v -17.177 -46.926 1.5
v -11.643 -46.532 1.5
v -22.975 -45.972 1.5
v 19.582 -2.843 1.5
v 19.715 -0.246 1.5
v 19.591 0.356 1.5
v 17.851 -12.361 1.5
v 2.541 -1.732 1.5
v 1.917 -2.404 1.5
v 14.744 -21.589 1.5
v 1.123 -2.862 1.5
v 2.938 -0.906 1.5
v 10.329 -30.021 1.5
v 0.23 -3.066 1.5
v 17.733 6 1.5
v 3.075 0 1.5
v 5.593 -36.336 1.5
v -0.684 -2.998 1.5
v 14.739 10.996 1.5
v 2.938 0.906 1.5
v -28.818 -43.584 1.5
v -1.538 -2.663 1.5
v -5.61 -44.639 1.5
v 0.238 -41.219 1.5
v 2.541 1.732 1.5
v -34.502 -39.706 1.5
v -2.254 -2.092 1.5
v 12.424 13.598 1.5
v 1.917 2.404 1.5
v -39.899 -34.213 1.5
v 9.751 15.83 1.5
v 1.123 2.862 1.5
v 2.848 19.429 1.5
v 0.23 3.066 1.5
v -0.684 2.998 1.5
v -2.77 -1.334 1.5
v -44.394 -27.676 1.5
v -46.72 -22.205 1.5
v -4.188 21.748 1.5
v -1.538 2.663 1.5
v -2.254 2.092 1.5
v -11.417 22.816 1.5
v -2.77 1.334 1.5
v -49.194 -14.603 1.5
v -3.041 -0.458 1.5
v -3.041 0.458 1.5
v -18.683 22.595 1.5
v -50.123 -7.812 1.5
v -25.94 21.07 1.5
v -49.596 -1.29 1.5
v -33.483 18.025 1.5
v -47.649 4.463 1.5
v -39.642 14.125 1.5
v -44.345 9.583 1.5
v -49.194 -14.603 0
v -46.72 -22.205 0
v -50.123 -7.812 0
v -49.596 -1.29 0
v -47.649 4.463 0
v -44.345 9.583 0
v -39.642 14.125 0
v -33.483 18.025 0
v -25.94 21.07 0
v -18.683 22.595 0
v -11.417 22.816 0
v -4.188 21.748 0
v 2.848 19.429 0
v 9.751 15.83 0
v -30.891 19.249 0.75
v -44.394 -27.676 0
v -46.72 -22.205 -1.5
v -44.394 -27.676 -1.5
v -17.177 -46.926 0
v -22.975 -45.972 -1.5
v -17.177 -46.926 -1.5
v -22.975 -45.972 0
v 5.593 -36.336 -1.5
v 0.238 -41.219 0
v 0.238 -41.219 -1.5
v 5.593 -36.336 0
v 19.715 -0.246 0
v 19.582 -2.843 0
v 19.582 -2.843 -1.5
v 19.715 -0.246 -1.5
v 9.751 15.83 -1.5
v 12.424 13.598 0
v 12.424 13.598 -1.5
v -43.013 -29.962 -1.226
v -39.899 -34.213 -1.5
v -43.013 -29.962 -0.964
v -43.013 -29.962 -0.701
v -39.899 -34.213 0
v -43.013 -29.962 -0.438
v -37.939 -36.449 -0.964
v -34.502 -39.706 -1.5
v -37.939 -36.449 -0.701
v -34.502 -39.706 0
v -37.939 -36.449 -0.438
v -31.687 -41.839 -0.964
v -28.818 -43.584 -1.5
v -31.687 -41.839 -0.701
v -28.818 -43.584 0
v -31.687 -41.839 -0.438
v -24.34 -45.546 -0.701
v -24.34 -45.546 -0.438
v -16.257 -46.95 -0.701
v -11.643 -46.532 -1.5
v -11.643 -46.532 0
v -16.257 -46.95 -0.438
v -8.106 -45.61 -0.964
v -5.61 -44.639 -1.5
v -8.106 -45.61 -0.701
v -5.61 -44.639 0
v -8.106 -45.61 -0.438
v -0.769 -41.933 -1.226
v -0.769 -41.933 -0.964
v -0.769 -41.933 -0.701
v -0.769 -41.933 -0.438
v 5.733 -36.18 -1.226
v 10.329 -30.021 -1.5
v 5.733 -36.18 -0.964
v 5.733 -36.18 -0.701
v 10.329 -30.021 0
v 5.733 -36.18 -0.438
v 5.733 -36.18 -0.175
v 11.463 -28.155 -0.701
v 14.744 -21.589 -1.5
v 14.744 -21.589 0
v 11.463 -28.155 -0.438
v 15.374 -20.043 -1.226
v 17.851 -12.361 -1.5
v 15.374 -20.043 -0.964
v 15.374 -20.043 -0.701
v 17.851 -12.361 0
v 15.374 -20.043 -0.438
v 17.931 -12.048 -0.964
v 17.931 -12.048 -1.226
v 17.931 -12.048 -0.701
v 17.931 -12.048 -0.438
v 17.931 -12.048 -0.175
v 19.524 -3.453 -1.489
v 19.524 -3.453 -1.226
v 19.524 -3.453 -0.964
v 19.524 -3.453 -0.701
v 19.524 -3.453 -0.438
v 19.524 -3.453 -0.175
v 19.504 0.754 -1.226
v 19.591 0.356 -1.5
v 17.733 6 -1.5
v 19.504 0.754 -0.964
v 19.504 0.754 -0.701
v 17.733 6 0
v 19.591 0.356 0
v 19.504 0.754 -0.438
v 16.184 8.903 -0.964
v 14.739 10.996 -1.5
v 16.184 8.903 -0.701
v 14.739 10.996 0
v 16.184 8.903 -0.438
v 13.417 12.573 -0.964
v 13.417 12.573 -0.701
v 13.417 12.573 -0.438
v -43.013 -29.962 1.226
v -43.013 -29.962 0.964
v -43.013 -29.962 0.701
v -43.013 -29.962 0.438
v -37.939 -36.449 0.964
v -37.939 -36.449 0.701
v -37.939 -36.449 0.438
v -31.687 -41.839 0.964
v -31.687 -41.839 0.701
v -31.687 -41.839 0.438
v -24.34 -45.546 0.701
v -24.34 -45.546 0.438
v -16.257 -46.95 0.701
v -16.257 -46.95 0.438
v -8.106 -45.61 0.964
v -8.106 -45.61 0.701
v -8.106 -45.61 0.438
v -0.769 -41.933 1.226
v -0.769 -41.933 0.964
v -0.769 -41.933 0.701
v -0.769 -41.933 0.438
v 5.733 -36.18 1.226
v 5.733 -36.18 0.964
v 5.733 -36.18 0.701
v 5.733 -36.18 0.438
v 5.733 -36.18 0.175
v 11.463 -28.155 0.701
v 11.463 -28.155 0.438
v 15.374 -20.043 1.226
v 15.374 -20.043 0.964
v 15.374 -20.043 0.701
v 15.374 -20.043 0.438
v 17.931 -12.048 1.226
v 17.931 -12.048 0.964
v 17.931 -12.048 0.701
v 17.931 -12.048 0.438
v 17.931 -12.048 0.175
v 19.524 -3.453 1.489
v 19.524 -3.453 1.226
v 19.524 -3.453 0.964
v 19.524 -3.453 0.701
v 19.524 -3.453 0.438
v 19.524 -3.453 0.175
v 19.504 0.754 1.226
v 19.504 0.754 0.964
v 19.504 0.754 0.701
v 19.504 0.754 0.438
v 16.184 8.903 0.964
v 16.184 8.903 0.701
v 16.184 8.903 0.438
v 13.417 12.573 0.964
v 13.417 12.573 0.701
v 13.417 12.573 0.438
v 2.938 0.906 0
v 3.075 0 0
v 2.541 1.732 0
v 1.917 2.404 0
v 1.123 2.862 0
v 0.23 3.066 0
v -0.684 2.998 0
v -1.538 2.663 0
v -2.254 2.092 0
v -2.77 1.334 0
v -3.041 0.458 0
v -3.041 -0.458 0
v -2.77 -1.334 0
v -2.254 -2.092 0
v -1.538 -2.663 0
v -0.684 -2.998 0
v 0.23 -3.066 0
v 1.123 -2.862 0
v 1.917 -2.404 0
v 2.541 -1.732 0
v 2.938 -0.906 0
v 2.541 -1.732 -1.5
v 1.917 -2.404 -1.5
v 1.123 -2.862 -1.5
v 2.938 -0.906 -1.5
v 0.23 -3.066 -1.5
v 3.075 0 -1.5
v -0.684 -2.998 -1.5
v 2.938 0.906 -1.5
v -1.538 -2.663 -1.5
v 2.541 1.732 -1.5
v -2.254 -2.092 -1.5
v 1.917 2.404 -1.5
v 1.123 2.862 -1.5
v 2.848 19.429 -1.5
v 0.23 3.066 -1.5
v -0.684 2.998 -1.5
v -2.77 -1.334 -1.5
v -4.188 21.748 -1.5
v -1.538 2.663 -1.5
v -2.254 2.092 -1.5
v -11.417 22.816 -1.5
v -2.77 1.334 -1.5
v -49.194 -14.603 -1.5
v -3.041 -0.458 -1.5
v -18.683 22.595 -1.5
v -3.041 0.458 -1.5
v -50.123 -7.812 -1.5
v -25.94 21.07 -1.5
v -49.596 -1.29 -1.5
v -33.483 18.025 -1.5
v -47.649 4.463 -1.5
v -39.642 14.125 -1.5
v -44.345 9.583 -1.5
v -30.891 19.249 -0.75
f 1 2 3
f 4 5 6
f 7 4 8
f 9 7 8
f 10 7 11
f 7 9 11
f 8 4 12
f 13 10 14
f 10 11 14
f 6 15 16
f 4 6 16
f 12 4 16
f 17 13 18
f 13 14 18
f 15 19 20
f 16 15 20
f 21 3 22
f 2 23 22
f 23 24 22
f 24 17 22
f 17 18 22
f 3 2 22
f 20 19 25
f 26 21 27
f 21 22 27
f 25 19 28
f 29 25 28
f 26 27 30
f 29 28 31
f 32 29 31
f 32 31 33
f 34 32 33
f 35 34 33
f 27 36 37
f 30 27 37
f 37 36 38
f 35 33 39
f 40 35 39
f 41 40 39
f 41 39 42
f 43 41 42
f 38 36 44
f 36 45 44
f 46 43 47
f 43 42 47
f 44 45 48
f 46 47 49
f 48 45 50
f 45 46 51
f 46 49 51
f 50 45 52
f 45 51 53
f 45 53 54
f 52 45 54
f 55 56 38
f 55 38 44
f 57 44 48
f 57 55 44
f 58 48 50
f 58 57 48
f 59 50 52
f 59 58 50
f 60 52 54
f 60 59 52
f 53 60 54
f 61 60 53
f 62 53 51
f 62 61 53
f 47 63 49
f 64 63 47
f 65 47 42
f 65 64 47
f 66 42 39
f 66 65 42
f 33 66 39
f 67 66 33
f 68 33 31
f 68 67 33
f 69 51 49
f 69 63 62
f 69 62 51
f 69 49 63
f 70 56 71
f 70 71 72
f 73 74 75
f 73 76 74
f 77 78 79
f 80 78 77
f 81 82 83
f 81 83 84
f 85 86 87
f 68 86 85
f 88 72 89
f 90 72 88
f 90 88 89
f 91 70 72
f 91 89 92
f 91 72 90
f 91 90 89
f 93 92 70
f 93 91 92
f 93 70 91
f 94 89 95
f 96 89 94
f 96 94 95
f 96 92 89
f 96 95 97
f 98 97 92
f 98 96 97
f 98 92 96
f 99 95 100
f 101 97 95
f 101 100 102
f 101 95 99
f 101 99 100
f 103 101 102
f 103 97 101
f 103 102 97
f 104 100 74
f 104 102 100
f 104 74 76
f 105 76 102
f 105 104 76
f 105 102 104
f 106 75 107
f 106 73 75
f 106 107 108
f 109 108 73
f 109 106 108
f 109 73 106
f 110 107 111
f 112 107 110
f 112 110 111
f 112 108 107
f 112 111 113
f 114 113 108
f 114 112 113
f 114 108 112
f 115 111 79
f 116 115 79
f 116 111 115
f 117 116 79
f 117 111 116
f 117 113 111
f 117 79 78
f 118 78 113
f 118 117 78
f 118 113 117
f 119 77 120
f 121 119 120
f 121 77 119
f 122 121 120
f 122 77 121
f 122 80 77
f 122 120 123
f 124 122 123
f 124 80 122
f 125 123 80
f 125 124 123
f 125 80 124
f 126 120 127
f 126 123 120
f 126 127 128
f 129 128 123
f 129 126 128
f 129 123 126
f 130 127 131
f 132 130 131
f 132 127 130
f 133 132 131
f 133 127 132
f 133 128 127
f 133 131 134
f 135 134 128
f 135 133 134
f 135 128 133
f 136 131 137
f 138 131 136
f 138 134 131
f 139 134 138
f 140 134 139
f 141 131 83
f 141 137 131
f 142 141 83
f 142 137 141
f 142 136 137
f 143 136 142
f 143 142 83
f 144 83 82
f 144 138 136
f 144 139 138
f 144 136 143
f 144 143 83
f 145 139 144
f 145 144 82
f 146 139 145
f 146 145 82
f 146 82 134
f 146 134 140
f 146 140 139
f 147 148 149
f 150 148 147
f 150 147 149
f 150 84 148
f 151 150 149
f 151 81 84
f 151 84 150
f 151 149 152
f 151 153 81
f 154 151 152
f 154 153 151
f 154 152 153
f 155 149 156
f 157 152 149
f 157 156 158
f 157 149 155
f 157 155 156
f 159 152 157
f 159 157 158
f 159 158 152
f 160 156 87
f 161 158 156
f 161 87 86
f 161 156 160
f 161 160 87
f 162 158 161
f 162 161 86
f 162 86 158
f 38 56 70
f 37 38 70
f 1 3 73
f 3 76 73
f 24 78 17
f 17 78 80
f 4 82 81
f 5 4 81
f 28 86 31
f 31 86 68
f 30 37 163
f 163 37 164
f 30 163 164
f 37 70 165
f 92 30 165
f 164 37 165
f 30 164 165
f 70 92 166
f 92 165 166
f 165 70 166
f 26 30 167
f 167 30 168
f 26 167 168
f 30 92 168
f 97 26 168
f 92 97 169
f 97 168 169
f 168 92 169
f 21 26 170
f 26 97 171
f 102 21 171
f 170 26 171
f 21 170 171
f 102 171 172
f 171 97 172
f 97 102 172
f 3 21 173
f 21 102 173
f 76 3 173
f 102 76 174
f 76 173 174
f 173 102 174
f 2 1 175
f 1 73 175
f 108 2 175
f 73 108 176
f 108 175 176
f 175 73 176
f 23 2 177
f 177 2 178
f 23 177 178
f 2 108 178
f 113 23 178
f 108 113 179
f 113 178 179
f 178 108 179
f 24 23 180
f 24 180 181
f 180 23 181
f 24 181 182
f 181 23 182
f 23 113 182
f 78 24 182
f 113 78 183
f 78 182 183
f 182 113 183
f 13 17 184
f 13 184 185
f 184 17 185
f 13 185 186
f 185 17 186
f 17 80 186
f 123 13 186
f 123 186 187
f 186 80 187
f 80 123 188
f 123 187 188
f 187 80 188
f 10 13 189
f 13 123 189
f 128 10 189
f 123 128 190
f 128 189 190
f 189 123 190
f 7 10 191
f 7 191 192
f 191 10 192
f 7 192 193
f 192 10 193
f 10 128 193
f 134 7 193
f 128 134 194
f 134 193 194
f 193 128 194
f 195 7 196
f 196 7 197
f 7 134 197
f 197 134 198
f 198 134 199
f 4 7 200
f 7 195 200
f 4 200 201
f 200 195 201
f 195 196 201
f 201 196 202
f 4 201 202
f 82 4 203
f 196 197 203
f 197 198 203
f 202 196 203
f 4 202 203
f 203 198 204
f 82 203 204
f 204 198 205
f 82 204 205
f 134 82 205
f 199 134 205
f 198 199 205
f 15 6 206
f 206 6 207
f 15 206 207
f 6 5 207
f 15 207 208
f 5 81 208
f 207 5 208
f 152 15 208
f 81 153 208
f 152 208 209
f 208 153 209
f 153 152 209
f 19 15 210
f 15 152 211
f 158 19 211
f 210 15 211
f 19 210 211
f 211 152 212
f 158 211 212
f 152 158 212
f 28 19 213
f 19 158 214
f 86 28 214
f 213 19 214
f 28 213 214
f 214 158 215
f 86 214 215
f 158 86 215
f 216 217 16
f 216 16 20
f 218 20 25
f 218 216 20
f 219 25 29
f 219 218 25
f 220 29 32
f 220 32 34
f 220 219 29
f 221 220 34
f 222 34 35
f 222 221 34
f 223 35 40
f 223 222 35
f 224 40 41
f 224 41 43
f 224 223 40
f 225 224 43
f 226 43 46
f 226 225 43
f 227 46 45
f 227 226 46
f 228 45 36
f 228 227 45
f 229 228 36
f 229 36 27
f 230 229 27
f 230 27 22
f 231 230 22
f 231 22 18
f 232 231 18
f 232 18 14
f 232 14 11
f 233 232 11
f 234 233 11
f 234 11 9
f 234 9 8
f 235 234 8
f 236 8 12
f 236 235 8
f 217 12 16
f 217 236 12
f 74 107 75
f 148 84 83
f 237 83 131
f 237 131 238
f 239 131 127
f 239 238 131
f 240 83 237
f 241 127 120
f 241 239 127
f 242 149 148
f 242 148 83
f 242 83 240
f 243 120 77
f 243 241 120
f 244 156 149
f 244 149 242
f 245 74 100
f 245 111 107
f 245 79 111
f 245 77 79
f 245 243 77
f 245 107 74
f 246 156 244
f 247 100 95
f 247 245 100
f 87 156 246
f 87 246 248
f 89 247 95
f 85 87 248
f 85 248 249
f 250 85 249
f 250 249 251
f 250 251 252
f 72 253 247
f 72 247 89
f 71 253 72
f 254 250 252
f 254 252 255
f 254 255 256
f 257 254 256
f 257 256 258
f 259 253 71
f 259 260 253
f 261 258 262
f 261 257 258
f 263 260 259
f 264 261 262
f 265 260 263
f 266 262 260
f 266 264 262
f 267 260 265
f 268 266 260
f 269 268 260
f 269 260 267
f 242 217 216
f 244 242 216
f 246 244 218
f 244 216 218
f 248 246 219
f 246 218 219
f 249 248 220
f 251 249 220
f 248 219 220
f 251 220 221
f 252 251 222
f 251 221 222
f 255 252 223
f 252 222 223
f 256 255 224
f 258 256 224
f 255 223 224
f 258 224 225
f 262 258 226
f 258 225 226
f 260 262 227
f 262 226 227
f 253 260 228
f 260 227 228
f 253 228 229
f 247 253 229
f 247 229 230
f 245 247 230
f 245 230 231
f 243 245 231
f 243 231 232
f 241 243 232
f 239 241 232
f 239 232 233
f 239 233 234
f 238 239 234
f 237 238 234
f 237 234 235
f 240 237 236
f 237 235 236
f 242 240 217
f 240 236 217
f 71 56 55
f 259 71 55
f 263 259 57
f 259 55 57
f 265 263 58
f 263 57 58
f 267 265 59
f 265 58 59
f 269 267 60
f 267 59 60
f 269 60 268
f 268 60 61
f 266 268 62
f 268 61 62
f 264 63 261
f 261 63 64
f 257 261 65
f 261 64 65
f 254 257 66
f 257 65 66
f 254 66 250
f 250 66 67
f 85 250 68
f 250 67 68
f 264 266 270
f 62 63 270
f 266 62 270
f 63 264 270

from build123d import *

# Parameters (mm, degrees)
SKETCH1_R           = 3.075
BOSS_EXTRUDE1_DEPTH = 1.5


with BuildPart() as part:
    # Sketch1 → Boss-Extrude1 (new body, symmetric)
    with BuildSketch(Plane.XY):
        with BuildLine():
            add(Edge.make_bspline(
                [(-46.720026773, -22.204755219), (-56.258450699, 0.901227349), (-32.275795778, 25.879881467), (-3.426291802, 24.043113756), (9.750652489, 15.829951888)],
                knots=[0, 0, 0, 0, 0.503099648, 0.999855604, 0.999855604, 0.999855604, 0.999855604], degree=3))
            add(Edge.make_bspline(
                [(-46.720026773, -22.204755219), (-46.680689643, -22.339756211), (-46.552337188, -22.765320129), (-46.315530335, -23.47521968), (-45.994724396, -24.328354304), (-45.64374303, -25.169381167), (-45.264635333, -25.998201376), (-44.859414404, -26.814840747), (-44.430052296, -27.619447636), (-43.978475067, -28.412290623), (-43.506557848, -29.193756113), (-43.016120213, -29.964345543), (-42.508920831, -30.724673408), (-41.98665903, -31.475455995), (-41.272178342, -32.465175872), (-40.530495583, -33.435911926), (-39.760654445, -34.385255136), (-39.168714607, -35.086236776), (-38.56223783, -35.775277911), (-37.941101655, -36.451661692), (-37.305218595, -37.114650493), (-36.654537169, -37.763487278), (-35.98904287, -38.397397013), (-35.308759098, -39.015588125), (-34.613748037, -39.617253979), (-33.904111484, -40.201574401), (-33.179991632, -40.767717226), (-32.441571792, -41.31483987), (-31.689077075, -41.842090945), (-30.922775009, -42.348611881), (-30.142976112, -42.833538592), (-29.350034402, -43.296003147), (-28.54434786, -43.735135476), (-27.72635883, -44.150065091), (-26.896554369, -44.539922823), (-26.05546653, -44.903842577), (-25.203672602, -45.240963106), (-24.34179528, -45.550429793), (-23.470502783, -45.831396446), (-22.59050891, -46.083027105), (-21.702573042, -46.304497856), (-20.807500078, -46.494998666), (-19.906140324, -46.653735147), (-18.999389287, -46.779930638), (-18.088187534, -46.872827111), (-17.173520021, -46.931690474), (-16.25641713, -46.955799458), (-15.337962254, -46.944496019), (-14.419416411, -46.897014519), (-13.502171458, -46.813870224), (-12.587669719, -46.695900505), (-11.677348446, -46.543928076), (-10.772586844, -46.358845594), (-9.874706443, -46.141589251), (-8.984969023, -45.893142696), (-8.10457535, -45.614532777), (-7.234663806, -45.306827414), (-6.376309167, -44.971132863), (-5.530521439, -44.608591087), (-4.698244808, -44.22037706), (-3.880356665, -43.807696049), (-3.07766673, -43.371780865), (-2.290916276, -42.913889097), (-1.520777431, -42.435300311), (-0.767852592, -41.937313243), (-0.032673923, -41.421242973), (0.684297044, -40.888418077), (1.38266972, -40.340177787), (2.062124662, -39.777869125), (2.722413692, -39.202844049), (3.363359912, -38.616456584), (3.984857621, -38.020059966), (4.586872142, -37.415003785), (5.16943955, -36.802631136), (5.7326663, -36.18427578), (6.276728773, -35.561259321), (6.801872699, -34.934888387), (7.308412557, -34.306451871), (7.796730652, -33.677218042), (8.267276932, -33.048432225), (8.720565676, -32.421312524), (9.157183177, -31.797052797), (9.577758987, -31.176793353), (9.983138756, -30.561603659), (10.623188649, -29.563083498), (11.342680336, -28.377433431), (12.119739062, -27.005776194), (12.731465669, -25.865724124), (13.298084183, -24.751341683), (13.822810829, -23.662816401), (14.308734968, -22.600140026), (14.82965827, -21.399879269), (15.371259255, -20.06920945), (15.976548886, -18.465026138), (16.512747902, -16.916122776), (16.988999025, -15.419907268), (17.372371177, -14.127644324), (17.68199046, -13.008697513), (17.931131914, -12.054226121), (18.129937195, -11.255668389), (18.316104219, -10.470635113), (18.49033416, -9.697832797), (18.653165351, -8.935984948), (18.804978039, -8.183844157), (18.946000172, -7.440203813), (19.076313861, -6.703909306), (19.19586254, -5.973868683), (19.304458777, -5.249062748), (19.417829782, -4.409840942), (19.500745235, -3.692433305), (19.559386299, -3.096194107), (19.591265488, -2.739927615), (19.619864108, -2.3841015), (19.645033575, -2.028659), (19.666894619, -1.673525742), (19.684543866, -1.318728399), (19.700873179, -0.9639535), (19.704615044, -0.610191975), (19.737521809, -0.250741843), (19.640954278, 0.099351506), (19.573563761, 0.452939858), (19.492985371, 0.803041009), (19.410795423, 1.15063058), (19.323979309, 1.495450325), (19.233401037, 1.837570516), (19.076564402, 2.400797966), (18.772619068, 3.395052185), (18.305566934, 4.686910126), (17.72821517, 6.038409458), (17.14129084, 7.240292034), (16.500918227, 8.398487991), (15.808316547, 9.512497778), (15.064493585, 10.581561026), (14.270307523, 11.604626241), (13.426532565, 12.580331676), (12.533925366, 13.506994912), (11.593291789, 14.38261199), (10.663595364, 15.156547445), (10.038178791, 15.624974817), (9.750652489, 15.829951888)],
                knots=[0.483675047, 0.483675047, 0.483675047, 0.483675047, 0.48572748, 0.490162693, 0.494596121, 0.499029126, 0.50346273, 0.507897674, 0.512334472, 0.516773466, 0.521214882, 0.525658883, 0.530105625, 0.534555313, 0.539008153, 0.5479229, 0.552384417, 0.556848379, 0.561314515, 0.565782528, 0.570252105, 0.57472292, 0.579194639, 0.583666924, 0.588139439, 0.592611855, 0.597083853, 0.601555132, 0.606025412, 0.610494439, 0.614961992, 0.619427887, 0.623891985, 0.628354194, 0.632814475, 0.637272853, 0.641729416, 0.646184326, 0.650637823, 0.655090233, 0.659541971, 0.663993554, 0.668445597, 0.672898832, 0.677354104, 0.681812384, 0.68627477, 0.690742499, 0.695216754, 0.699697325, 0.704183213, 0.708673274, 0.713166232, 0.71766069, 0.722155137, 0.726647962, 0.731137456, 0.735621826, 0.7400992, 0.744567632, 0.749025113, 0.753469575, 0.757898896, 0.762310907, 0.766703399, 0.771074124, 0.775420805, 0.779741136, 0.784032793, 0.788293433, 0.792520702, 0.796712241, 0.800865688, 0.804978687, 0.809048891, 0.813073968, 0.817051612, 0.820979544, 0.824855525, 0.82867736, 0.832442913, 0.836150111, 0.839796963, 0.843381676, 0.84690413, 0.857109335, 0.863622561, 0.86991433, 0.875993807, 0.881870128, 0.887552392, 0.893049665, 0.900968457, 0.908521612, 0.918075538, 0.924891611, 0.931440483, 0.937750475, 0.941838034, 0.945839551, 0.949762689, 0.953614851, 0.957403159, 0.961134423, 0.964815124, 0.96845139, 0.972048981, 0.975613274, 0.979149256, 0.984410078, 0.98615425, 0.987894493, 0.989631248, 0.991364926, 0.993095918, 0.994824589, 0.996551283, 0.998276321, 1, 1.001764203, 1.003519492, 1.005266096, 1.007004244, 1.008734164, 1.010456082, 1.01217022, 1.017268173, 1.025629542, 1.032212071, 1.038713875, 1.045147285, 1.05152405, 1.057855307, 1.064151567, 1.070422701, 1.076677929, 1.082925818, 1.089174283, 1.094328624, 1.094328624, 1.094328624, 1.094328624], degree=3))
        make_face()
        Circle(SKETCH1_R, mode=Mode.SUBTRACT)
    extrude(amount=BOSS_EXTRUDE1_DEPTH, both=True)


solid = part.part
